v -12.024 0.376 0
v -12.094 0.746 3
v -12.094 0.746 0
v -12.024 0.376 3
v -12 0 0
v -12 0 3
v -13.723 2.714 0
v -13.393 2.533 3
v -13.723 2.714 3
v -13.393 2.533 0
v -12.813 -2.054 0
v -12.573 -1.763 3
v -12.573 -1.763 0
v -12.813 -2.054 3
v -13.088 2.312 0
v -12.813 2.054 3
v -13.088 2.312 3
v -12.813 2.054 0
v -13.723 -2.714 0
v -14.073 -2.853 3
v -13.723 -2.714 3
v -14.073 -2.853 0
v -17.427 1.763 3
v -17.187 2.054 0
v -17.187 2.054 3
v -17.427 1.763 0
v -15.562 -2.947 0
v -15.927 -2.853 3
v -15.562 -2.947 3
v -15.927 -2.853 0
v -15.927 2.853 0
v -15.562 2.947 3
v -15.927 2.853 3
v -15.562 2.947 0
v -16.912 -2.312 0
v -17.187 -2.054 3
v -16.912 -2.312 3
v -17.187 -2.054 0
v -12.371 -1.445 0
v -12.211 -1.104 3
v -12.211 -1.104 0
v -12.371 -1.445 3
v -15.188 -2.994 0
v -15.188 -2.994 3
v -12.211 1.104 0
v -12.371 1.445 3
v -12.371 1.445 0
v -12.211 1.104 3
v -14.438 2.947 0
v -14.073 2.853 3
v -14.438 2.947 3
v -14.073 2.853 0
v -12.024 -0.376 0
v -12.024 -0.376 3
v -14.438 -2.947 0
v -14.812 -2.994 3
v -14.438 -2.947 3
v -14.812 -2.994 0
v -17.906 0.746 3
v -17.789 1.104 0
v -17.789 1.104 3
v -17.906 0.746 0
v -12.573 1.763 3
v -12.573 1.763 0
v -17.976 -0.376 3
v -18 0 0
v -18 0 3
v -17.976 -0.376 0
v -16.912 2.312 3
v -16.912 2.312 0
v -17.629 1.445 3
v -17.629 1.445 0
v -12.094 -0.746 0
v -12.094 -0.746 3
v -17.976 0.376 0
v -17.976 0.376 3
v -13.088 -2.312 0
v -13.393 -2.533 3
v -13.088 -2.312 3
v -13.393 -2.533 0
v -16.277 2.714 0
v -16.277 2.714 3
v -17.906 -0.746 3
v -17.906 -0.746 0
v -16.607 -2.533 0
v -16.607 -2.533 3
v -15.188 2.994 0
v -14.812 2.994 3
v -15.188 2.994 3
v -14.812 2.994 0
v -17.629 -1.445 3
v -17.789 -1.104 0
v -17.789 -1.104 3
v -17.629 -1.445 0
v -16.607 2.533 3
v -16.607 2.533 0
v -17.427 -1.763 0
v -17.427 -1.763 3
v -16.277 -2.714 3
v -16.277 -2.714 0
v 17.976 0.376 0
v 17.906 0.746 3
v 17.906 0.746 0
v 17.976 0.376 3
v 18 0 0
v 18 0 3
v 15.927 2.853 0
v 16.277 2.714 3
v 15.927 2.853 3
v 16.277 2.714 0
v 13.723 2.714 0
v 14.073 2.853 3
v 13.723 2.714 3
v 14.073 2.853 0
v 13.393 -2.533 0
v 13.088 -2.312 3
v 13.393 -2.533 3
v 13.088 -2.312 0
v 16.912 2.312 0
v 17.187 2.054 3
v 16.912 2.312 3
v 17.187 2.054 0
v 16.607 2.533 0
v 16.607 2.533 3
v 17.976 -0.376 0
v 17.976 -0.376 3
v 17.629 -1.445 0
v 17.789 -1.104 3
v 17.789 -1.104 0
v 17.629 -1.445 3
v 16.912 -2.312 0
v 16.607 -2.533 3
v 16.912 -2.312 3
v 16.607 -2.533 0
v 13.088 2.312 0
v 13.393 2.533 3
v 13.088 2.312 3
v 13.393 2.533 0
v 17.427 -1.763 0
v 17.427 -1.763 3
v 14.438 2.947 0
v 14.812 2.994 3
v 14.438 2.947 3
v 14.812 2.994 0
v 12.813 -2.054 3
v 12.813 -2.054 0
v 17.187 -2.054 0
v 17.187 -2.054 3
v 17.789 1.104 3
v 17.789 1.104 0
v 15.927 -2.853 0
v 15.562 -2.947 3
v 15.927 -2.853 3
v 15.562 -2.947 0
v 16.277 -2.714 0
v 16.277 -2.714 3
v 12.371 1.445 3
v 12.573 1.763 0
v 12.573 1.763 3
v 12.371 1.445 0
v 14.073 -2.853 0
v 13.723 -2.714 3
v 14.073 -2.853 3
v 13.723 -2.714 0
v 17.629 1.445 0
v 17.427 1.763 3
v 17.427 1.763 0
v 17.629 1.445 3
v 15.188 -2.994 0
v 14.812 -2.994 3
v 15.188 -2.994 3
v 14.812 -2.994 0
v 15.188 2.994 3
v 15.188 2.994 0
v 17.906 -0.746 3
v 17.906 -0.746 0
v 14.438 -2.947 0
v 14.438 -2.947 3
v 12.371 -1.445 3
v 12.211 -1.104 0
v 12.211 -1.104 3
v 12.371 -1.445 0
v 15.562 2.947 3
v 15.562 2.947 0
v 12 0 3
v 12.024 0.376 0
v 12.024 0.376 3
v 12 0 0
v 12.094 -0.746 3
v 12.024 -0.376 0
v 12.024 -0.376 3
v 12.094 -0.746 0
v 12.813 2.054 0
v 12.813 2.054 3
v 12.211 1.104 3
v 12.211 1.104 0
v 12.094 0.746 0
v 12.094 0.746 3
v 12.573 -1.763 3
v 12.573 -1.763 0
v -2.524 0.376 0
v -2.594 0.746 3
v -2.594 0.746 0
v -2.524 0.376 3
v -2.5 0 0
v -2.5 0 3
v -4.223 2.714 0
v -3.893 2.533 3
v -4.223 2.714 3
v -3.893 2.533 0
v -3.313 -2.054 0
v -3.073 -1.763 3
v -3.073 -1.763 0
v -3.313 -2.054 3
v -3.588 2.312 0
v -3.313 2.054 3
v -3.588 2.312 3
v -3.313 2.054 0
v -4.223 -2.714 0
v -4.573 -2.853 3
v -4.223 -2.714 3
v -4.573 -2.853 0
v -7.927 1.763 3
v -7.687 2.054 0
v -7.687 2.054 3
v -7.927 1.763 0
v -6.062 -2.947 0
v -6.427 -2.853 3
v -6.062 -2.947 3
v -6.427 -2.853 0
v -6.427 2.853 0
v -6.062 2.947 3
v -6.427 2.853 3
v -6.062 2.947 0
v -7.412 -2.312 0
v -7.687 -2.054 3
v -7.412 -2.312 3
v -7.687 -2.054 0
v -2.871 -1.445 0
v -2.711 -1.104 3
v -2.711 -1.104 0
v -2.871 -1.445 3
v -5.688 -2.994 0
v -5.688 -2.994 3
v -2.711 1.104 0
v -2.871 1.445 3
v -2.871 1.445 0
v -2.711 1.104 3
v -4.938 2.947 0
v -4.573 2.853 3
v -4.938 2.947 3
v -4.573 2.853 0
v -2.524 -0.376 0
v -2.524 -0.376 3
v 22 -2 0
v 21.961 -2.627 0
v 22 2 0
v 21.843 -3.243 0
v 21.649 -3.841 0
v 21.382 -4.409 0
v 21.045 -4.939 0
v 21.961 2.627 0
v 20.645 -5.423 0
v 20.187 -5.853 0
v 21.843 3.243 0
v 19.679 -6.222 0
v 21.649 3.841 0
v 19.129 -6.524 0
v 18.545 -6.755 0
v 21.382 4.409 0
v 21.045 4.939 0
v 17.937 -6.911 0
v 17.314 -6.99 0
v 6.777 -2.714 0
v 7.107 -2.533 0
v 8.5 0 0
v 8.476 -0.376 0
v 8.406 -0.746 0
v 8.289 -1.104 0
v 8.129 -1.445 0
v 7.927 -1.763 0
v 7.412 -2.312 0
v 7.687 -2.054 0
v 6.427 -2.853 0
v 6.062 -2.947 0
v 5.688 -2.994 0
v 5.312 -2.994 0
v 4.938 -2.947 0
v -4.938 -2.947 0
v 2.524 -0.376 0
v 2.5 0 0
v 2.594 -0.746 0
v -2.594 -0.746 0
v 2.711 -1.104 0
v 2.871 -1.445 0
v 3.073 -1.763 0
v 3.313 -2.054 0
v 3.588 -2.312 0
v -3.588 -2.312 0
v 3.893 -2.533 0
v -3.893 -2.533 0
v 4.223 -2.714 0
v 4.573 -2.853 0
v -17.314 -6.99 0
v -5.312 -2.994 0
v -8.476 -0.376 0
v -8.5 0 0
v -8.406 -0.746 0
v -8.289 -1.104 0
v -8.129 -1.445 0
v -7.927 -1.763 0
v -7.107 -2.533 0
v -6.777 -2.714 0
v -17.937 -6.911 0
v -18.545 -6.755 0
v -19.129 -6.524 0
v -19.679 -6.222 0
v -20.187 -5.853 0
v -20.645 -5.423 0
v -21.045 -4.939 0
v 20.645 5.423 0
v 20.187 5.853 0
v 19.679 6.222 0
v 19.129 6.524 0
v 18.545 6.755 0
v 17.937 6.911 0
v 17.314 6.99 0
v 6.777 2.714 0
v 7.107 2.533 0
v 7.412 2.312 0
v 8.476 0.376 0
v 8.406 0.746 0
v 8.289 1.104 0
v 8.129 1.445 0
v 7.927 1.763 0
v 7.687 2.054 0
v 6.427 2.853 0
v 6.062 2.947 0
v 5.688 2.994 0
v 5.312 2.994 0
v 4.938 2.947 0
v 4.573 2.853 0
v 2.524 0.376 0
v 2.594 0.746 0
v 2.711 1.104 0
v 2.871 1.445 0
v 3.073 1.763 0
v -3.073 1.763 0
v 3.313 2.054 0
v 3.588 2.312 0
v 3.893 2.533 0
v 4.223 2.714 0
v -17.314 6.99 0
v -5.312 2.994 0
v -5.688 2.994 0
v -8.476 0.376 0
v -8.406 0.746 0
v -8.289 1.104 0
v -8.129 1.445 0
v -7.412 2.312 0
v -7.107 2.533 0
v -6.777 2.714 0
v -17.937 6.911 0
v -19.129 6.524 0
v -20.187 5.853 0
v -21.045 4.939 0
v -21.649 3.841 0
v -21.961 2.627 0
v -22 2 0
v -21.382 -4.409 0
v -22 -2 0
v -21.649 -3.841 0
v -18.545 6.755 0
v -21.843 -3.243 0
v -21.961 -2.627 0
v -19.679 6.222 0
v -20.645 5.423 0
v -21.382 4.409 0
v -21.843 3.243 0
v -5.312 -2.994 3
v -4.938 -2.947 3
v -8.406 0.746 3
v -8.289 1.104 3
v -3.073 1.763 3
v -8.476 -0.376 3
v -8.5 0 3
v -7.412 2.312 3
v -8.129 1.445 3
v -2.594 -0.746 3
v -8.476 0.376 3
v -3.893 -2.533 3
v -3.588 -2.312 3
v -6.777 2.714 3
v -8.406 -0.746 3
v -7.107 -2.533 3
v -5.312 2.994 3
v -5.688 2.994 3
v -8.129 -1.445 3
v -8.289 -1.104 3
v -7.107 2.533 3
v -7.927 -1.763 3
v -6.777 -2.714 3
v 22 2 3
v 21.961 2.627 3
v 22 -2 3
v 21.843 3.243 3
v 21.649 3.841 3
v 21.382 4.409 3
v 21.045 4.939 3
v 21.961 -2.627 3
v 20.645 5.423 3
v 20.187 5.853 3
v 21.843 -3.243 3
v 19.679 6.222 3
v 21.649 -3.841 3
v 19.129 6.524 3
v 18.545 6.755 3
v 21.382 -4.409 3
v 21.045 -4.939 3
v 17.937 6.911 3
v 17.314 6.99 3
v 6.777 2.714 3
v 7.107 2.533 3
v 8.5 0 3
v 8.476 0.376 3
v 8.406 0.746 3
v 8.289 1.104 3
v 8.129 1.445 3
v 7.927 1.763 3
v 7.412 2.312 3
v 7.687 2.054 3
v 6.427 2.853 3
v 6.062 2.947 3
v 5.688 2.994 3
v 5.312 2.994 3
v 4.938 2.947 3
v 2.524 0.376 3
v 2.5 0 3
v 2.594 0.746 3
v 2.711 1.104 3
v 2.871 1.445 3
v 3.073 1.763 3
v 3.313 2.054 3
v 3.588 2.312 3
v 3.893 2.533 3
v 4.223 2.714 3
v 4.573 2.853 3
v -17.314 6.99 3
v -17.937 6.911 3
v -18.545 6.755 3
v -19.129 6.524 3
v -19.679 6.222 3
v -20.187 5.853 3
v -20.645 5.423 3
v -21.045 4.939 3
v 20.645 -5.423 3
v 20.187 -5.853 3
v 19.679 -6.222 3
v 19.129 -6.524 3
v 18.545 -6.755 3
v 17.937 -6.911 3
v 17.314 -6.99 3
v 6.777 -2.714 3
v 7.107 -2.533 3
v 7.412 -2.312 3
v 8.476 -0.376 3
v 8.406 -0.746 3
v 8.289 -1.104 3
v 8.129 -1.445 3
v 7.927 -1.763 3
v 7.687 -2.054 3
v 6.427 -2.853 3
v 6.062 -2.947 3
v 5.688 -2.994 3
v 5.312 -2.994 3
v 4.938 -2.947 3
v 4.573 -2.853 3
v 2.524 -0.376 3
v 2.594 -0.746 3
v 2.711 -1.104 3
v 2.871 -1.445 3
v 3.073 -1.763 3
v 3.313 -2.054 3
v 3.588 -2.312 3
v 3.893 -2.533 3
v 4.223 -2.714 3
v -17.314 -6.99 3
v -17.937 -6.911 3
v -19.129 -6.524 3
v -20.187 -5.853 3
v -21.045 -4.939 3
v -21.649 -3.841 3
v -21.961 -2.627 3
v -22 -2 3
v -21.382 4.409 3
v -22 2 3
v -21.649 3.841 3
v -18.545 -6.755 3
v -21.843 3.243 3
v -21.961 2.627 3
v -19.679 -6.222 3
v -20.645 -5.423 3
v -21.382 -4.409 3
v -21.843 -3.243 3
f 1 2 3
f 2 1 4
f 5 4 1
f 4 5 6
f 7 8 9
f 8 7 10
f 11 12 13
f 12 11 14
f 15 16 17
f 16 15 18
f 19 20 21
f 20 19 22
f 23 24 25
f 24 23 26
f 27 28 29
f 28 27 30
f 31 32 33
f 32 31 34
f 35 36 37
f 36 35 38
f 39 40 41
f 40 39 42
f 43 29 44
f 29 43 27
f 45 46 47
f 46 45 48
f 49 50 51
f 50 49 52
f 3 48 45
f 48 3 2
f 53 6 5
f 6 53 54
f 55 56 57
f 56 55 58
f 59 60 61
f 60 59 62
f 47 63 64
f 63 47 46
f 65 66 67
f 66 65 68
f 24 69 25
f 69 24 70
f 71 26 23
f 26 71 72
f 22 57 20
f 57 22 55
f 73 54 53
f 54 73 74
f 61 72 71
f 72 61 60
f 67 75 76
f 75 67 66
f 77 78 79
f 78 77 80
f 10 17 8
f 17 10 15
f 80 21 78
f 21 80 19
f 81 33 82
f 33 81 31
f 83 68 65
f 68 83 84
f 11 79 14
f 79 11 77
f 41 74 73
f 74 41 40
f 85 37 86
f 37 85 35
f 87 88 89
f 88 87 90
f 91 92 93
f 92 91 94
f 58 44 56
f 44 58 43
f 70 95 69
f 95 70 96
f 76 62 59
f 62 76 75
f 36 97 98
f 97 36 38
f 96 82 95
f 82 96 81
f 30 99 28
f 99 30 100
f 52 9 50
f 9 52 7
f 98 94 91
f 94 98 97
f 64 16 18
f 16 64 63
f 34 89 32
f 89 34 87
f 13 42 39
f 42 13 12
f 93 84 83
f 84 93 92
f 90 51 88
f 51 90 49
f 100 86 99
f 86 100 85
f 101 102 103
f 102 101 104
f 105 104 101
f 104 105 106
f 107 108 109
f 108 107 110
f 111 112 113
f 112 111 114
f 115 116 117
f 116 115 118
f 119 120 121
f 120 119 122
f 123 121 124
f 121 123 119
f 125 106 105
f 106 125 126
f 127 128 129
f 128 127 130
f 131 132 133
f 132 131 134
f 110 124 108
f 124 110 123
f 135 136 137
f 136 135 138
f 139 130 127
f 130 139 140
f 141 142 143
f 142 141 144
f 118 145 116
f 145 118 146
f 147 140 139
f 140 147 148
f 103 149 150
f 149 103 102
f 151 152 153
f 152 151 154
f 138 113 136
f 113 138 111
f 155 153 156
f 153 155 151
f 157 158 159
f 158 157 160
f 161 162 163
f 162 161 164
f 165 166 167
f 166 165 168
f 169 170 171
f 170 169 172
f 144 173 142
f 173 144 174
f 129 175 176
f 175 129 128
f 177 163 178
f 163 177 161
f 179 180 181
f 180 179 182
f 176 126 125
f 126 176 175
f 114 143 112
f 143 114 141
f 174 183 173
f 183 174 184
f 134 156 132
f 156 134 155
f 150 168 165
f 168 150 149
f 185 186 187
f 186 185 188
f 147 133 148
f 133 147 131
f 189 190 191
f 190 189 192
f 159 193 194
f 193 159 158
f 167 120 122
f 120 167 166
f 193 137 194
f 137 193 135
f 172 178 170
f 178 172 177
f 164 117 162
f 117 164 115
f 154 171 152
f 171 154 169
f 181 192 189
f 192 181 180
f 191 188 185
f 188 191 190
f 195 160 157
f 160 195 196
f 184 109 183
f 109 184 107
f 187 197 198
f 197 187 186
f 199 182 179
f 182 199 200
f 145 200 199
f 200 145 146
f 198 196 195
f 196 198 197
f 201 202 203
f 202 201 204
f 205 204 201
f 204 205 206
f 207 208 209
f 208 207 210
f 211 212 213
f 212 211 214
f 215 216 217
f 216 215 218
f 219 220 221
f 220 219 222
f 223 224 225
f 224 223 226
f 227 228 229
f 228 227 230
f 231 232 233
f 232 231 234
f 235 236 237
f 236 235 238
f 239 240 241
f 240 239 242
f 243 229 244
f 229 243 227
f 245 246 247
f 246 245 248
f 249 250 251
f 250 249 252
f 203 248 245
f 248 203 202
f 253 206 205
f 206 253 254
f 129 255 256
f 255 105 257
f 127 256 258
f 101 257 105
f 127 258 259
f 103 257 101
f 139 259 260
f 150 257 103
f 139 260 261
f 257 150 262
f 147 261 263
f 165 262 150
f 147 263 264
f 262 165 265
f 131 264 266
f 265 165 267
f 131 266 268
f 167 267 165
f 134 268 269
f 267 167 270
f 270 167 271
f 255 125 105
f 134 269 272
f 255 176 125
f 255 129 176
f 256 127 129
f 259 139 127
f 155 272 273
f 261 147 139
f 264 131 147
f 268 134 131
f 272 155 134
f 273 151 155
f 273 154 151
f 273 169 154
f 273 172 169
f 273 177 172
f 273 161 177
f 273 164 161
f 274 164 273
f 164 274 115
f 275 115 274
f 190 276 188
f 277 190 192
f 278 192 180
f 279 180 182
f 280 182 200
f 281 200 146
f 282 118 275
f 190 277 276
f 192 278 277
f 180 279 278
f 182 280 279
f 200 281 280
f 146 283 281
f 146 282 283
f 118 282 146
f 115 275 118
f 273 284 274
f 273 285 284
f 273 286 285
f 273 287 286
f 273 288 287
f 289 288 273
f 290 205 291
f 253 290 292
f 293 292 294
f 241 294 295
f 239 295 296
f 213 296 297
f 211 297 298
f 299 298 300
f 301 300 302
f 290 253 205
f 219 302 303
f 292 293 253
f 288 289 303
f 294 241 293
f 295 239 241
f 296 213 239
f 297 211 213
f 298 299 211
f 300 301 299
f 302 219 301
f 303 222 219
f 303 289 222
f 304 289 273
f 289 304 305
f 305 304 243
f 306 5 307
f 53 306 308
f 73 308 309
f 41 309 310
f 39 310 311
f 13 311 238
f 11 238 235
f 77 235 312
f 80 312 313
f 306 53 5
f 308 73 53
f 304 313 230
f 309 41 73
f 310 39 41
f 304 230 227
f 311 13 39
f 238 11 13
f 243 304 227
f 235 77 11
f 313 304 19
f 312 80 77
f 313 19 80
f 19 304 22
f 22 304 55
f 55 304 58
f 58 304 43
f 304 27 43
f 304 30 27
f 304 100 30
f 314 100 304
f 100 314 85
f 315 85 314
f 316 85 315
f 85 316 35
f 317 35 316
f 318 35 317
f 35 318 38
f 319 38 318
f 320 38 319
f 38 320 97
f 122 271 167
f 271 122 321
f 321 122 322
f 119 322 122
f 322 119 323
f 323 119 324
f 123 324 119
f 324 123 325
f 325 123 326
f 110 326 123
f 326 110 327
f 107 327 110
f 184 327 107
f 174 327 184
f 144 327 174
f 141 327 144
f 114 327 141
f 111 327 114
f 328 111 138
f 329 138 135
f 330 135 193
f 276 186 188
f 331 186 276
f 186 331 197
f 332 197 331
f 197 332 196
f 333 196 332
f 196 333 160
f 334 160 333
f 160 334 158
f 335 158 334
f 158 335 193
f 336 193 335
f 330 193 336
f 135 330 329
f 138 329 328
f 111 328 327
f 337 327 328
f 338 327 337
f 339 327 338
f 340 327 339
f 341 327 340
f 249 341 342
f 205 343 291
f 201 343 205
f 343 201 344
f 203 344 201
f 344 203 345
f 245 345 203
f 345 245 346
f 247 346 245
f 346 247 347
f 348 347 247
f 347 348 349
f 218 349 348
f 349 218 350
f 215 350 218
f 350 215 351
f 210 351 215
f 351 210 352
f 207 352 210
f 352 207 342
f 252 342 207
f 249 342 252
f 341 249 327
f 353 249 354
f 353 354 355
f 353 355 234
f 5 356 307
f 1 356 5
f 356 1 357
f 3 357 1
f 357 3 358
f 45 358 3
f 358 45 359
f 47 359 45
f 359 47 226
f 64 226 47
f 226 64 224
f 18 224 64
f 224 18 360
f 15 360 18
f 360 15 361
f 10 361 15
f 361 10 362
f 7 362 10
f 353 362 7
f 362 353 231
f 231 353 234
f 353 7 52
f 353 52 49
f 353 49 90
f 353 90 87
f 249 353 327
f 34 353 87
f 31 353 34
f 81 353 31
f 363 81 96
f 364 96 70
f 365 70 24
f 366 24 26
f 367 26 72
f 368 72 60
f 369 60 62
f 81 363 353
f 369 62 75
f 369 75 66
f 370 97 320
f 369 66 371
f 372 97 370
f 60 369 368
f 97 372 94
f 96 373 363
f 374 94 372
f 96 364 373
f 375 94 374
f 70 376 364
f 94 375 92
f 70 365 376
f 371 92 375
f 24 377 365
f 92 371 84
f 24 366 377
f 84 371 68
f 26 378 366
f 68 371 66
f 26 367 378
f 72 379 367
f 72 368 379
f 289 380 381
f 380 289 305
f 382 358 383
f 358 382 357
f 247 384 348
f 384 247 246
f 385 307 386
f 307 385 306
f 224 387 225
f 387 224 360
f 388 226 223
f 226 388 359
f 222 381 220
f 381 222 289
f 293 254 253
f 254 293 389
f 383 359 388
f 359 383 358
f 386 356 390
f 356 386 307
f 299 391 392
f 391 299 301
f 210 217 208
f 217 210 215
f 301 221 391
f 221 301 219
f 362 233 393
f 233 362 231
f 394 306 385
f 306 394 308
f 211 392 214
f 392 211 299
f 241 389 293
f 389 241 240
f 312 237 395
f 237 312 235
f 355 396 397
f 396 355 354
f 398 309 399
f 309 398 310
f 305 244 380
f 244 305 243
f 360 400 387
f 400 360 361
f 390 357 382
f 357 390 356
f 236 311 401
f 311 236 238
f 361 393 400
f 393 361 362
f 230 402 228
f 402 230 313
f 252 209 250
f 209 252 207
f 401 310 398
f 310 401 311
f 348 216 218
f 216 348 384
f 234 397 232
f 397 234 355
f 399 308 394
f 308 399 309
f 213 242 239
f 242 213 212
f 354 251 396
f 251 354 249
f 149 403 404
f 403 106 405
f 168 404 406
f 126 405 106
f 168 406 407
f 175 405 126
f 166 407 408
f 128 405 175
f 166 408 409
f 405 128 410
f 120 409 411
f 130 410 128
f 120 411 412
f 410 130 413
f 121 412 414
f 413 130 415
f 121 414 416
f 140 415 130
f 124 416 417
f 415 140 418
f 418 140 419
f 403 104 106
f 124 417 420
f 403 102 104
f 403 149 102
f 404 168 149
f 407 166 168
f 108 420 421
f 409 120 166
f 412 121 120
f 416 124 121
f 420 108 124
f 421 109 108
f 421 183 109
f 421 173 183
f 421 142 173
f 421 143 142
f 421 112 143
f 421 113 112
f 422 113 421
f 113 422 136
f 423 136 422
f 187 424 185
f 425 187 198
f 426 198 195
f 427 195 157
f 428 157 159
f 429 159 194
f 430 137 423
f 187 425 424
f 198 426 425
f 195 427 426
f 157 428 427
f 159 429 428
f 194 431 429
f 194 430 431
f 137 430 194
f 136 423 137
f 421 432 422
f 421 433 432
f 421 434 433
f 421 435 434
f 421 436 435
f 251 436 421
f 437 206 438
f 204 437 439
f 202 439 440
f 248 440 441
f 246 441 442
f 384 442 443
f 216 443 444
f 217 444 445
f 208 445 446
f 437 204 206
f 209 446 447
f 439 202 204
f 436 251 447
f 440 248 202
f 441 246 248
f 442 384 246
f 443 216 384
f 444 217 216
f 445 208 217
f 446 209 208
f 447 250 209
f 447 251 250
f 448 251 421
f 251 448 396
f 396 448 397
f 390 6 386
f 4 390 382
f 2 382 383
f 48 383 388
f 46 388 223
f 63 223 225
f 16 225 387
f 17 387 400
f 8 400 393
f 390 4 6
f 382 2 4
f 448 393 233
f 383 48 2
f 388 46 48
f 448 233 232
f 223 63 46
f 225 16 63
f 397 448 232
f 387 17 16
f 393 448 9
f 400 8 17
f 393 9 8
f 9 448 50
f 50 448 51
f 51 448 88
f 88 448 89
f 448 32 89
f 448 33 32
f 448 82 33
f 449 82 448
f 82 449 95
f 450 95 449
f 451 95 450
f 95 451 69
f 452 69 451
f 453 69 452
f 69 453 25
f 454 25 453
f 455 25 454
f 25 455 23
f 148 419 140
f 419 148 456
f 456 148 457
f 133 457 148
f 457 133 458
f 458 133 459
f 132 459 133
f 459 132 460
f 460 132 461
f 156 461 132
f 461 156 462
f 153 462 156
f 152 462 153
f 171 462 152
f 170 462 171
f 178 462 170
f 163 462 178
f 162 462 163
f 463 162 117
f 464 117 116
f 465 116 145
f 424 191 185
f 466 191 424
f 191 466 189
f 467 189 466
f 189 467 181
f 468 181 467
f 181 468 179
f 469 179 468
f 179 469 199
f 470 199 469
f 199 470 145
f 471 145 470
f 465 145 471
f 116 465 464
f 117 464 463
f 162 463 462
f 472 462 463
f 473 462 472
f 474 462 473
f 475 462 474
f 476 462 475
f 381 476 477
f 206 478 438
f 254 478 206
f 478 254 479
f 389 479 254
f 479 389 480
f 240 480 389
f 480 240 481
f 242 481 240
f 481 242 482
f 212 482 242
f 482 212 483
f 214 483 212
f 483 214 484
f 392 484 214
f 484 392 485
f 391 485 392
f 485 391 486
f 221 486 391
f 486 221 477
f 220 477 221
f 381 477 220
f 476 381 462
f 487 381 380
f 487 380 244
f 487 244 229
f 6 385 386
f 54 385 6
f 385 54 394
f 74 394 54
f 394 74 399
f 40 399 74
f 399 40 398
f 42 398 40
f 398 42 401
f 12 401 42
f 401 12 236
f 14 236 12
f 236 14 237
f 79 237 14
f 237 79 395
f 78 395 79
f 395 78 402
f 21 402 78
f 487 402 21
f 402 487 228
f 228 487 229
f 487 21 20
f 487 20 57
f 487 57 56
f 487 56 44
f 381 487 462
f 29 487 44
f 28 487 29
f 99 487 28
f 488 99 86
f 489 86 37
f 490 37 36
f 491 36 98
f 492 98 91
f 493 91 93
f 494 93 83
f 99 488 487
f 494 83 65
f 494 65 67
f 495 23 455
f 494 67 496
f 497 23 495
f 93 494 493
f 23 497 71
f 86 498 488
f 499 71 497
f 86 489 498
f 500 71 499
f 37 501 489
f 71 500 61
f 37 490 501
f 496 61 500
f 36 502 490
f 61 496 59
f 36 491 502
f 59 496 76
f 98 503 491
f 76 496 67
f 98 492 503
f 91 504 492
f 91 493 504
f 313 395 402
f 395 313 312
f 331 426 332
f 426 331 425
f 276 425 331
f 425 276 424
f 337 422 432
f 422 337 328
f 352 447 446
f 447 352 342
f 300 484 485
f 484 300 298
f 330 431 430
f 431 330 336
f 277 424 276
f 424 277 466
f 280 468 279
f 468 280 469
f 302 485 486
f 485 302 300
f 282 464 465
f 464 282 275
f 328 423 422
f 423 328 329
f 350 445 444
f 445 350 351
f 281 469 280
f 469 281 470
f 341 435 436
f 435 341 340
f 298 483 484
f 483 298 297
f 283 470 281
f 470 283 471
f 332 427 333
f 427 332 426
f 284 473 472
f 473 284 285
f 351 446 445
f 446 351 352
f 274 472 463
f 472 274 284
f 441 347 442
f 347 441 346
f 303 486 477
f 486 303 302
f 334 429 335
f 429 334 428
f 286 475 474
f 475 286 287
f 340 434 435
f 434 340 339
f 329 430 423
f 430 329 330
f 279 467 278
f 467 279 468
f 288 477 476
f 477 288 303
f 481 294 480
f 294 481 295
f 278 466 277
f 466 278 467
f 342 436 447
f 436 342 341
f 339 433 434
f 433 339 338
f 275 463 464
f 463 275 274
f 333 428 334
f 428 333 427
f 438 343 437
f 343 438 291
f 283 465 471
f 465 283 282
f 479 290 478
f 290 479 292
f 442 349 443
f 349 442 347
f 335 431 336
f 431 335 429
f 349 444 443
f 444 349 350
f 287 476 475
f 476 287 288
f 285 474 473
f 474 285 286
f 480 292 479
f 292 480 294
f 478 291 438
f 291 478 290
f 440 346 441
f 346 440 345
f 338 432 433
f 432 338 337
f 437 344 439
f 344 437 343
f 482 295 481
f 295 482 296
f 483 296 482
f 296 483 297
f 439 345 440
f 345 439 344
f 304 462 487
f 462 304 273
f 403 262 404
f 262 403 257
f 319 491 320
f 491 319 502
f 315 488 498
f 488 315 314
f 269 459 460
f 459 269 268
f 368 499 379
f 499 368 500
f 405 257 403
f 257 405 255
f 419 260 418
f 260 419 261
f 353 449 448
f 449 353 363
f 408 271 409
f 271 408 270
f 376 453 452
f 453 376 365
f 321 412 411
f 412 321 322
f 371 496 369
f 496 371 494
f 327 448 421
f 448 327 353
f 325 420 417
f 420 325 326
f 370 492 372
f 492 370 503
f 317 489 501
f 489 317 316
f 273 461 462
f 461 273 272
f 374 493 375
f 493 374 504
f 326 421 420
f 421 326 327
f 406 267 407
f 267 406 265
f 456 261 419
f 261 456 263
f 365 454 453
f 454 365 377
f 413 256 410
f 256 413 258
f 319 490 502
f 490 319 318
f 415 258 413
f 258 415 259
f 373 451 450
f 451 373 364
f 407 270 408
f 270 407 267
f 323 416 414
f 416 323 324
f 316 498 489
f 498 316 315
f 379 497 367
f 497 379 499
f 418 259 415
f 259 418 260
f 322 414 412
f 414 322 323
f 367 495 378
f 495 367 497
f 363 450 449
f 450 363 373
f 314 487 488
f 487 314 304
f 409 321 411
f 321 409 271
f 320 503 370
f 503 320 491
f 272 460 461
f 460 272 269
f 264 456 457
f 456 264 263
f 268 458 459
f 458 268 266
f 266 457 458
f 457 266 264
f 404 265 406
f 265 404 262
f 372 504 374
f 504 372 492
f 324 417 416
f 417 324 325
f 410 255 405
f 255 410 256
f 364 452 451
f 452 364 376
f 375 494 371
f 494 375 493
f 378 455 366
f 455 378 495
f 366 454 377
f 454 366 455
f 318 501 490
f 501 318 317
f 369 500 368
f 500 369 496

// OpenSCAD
$fn = 50;


difference() {
	union() {
		hull() {
			translate(v = [-17.0000000000, 2.0000000000, 0]) {
				cylinder(h = 3, r = 5);
			}
			translate(v = [17.0000000000, 2.0000000000, 0]) {
				cylinder(h = 3, r = 5);
			}
			translate(v = [-17.0000000000, -2.0000000000, 0]) {
				cylinder(h = 3, r = 5);
			}
			translate(v = [17.0000000000, -2.0000000000, 0]) {
				cylinder(h = 3, r = 5);
			}
		}
	}
	union() {
		#translate(v = [-15.0000000000, 0.0000000000, 0]) {
			cylinder(h = 3, r = 3.0000000000);
		}
		#translate(v = [15.0000000000, 0.0000000000, 0]) {
			cylinder(h = 3, r = 3.0000000000);
		}
		#translate(v = [-15.0000000000, 0.0000000000, -100.0000000000]) {
			cylinder(h = 200, r = 3.0000000000);
		}
		#translate(v = [-15.0000000000, 0.0000000000, -100.0000000000]) {
			cylinder(h = 200, r = 3.0000000000);
		}
		#translate(v = [15.0000000000, 0.0000000000, -100.0000000000]) {
			cylinder(h = 200, r = 3.0000000000);
		}
		#translate(v = [15.0000000000, 0.0000000000, -100.0000000000]) {
			cylinder(h = 200, r = 3.0000000000);
		}
		#translate(v = [-15.0000000000, 0.0000000000, 0]) {
			cylinder(h = 3, r = 1.5000000000);
		}
		#translate(v = [15.0000000000, 0.0000000000, 0]) {
			cylinder(h = 3, r = 1.5000000000);
		}
		#translate(v = [-15.0000000000, 0.0000000000, 0]) {
			cylinder(h = 3, r = 1.5000000000);
		}
		#translate(v = [15.0000000000, 0.0000000000, 0]) {
			cylinder(h = 3, r = 1.5000000000);
		}
		#translate(v = [-15.0000000000, 0.0000000000, 0]) {
			cylinder(h = 3, r = 1.5000000000);
		}
		#translate(v = [15.0000000000, 0.0000000000, 0]) {
			cylinder(h = 3, r = 1.5000000000);
		}
		#translate(v = [-5.5000000000, 0, 0]) {
			cylinder(h = 3, r = 3.0000000000);
		}
		#translate(v = [5.5000000000, 0, 0]) {
			cylinder(h = 3, r = 3.0000000000);
		}
	}
}
